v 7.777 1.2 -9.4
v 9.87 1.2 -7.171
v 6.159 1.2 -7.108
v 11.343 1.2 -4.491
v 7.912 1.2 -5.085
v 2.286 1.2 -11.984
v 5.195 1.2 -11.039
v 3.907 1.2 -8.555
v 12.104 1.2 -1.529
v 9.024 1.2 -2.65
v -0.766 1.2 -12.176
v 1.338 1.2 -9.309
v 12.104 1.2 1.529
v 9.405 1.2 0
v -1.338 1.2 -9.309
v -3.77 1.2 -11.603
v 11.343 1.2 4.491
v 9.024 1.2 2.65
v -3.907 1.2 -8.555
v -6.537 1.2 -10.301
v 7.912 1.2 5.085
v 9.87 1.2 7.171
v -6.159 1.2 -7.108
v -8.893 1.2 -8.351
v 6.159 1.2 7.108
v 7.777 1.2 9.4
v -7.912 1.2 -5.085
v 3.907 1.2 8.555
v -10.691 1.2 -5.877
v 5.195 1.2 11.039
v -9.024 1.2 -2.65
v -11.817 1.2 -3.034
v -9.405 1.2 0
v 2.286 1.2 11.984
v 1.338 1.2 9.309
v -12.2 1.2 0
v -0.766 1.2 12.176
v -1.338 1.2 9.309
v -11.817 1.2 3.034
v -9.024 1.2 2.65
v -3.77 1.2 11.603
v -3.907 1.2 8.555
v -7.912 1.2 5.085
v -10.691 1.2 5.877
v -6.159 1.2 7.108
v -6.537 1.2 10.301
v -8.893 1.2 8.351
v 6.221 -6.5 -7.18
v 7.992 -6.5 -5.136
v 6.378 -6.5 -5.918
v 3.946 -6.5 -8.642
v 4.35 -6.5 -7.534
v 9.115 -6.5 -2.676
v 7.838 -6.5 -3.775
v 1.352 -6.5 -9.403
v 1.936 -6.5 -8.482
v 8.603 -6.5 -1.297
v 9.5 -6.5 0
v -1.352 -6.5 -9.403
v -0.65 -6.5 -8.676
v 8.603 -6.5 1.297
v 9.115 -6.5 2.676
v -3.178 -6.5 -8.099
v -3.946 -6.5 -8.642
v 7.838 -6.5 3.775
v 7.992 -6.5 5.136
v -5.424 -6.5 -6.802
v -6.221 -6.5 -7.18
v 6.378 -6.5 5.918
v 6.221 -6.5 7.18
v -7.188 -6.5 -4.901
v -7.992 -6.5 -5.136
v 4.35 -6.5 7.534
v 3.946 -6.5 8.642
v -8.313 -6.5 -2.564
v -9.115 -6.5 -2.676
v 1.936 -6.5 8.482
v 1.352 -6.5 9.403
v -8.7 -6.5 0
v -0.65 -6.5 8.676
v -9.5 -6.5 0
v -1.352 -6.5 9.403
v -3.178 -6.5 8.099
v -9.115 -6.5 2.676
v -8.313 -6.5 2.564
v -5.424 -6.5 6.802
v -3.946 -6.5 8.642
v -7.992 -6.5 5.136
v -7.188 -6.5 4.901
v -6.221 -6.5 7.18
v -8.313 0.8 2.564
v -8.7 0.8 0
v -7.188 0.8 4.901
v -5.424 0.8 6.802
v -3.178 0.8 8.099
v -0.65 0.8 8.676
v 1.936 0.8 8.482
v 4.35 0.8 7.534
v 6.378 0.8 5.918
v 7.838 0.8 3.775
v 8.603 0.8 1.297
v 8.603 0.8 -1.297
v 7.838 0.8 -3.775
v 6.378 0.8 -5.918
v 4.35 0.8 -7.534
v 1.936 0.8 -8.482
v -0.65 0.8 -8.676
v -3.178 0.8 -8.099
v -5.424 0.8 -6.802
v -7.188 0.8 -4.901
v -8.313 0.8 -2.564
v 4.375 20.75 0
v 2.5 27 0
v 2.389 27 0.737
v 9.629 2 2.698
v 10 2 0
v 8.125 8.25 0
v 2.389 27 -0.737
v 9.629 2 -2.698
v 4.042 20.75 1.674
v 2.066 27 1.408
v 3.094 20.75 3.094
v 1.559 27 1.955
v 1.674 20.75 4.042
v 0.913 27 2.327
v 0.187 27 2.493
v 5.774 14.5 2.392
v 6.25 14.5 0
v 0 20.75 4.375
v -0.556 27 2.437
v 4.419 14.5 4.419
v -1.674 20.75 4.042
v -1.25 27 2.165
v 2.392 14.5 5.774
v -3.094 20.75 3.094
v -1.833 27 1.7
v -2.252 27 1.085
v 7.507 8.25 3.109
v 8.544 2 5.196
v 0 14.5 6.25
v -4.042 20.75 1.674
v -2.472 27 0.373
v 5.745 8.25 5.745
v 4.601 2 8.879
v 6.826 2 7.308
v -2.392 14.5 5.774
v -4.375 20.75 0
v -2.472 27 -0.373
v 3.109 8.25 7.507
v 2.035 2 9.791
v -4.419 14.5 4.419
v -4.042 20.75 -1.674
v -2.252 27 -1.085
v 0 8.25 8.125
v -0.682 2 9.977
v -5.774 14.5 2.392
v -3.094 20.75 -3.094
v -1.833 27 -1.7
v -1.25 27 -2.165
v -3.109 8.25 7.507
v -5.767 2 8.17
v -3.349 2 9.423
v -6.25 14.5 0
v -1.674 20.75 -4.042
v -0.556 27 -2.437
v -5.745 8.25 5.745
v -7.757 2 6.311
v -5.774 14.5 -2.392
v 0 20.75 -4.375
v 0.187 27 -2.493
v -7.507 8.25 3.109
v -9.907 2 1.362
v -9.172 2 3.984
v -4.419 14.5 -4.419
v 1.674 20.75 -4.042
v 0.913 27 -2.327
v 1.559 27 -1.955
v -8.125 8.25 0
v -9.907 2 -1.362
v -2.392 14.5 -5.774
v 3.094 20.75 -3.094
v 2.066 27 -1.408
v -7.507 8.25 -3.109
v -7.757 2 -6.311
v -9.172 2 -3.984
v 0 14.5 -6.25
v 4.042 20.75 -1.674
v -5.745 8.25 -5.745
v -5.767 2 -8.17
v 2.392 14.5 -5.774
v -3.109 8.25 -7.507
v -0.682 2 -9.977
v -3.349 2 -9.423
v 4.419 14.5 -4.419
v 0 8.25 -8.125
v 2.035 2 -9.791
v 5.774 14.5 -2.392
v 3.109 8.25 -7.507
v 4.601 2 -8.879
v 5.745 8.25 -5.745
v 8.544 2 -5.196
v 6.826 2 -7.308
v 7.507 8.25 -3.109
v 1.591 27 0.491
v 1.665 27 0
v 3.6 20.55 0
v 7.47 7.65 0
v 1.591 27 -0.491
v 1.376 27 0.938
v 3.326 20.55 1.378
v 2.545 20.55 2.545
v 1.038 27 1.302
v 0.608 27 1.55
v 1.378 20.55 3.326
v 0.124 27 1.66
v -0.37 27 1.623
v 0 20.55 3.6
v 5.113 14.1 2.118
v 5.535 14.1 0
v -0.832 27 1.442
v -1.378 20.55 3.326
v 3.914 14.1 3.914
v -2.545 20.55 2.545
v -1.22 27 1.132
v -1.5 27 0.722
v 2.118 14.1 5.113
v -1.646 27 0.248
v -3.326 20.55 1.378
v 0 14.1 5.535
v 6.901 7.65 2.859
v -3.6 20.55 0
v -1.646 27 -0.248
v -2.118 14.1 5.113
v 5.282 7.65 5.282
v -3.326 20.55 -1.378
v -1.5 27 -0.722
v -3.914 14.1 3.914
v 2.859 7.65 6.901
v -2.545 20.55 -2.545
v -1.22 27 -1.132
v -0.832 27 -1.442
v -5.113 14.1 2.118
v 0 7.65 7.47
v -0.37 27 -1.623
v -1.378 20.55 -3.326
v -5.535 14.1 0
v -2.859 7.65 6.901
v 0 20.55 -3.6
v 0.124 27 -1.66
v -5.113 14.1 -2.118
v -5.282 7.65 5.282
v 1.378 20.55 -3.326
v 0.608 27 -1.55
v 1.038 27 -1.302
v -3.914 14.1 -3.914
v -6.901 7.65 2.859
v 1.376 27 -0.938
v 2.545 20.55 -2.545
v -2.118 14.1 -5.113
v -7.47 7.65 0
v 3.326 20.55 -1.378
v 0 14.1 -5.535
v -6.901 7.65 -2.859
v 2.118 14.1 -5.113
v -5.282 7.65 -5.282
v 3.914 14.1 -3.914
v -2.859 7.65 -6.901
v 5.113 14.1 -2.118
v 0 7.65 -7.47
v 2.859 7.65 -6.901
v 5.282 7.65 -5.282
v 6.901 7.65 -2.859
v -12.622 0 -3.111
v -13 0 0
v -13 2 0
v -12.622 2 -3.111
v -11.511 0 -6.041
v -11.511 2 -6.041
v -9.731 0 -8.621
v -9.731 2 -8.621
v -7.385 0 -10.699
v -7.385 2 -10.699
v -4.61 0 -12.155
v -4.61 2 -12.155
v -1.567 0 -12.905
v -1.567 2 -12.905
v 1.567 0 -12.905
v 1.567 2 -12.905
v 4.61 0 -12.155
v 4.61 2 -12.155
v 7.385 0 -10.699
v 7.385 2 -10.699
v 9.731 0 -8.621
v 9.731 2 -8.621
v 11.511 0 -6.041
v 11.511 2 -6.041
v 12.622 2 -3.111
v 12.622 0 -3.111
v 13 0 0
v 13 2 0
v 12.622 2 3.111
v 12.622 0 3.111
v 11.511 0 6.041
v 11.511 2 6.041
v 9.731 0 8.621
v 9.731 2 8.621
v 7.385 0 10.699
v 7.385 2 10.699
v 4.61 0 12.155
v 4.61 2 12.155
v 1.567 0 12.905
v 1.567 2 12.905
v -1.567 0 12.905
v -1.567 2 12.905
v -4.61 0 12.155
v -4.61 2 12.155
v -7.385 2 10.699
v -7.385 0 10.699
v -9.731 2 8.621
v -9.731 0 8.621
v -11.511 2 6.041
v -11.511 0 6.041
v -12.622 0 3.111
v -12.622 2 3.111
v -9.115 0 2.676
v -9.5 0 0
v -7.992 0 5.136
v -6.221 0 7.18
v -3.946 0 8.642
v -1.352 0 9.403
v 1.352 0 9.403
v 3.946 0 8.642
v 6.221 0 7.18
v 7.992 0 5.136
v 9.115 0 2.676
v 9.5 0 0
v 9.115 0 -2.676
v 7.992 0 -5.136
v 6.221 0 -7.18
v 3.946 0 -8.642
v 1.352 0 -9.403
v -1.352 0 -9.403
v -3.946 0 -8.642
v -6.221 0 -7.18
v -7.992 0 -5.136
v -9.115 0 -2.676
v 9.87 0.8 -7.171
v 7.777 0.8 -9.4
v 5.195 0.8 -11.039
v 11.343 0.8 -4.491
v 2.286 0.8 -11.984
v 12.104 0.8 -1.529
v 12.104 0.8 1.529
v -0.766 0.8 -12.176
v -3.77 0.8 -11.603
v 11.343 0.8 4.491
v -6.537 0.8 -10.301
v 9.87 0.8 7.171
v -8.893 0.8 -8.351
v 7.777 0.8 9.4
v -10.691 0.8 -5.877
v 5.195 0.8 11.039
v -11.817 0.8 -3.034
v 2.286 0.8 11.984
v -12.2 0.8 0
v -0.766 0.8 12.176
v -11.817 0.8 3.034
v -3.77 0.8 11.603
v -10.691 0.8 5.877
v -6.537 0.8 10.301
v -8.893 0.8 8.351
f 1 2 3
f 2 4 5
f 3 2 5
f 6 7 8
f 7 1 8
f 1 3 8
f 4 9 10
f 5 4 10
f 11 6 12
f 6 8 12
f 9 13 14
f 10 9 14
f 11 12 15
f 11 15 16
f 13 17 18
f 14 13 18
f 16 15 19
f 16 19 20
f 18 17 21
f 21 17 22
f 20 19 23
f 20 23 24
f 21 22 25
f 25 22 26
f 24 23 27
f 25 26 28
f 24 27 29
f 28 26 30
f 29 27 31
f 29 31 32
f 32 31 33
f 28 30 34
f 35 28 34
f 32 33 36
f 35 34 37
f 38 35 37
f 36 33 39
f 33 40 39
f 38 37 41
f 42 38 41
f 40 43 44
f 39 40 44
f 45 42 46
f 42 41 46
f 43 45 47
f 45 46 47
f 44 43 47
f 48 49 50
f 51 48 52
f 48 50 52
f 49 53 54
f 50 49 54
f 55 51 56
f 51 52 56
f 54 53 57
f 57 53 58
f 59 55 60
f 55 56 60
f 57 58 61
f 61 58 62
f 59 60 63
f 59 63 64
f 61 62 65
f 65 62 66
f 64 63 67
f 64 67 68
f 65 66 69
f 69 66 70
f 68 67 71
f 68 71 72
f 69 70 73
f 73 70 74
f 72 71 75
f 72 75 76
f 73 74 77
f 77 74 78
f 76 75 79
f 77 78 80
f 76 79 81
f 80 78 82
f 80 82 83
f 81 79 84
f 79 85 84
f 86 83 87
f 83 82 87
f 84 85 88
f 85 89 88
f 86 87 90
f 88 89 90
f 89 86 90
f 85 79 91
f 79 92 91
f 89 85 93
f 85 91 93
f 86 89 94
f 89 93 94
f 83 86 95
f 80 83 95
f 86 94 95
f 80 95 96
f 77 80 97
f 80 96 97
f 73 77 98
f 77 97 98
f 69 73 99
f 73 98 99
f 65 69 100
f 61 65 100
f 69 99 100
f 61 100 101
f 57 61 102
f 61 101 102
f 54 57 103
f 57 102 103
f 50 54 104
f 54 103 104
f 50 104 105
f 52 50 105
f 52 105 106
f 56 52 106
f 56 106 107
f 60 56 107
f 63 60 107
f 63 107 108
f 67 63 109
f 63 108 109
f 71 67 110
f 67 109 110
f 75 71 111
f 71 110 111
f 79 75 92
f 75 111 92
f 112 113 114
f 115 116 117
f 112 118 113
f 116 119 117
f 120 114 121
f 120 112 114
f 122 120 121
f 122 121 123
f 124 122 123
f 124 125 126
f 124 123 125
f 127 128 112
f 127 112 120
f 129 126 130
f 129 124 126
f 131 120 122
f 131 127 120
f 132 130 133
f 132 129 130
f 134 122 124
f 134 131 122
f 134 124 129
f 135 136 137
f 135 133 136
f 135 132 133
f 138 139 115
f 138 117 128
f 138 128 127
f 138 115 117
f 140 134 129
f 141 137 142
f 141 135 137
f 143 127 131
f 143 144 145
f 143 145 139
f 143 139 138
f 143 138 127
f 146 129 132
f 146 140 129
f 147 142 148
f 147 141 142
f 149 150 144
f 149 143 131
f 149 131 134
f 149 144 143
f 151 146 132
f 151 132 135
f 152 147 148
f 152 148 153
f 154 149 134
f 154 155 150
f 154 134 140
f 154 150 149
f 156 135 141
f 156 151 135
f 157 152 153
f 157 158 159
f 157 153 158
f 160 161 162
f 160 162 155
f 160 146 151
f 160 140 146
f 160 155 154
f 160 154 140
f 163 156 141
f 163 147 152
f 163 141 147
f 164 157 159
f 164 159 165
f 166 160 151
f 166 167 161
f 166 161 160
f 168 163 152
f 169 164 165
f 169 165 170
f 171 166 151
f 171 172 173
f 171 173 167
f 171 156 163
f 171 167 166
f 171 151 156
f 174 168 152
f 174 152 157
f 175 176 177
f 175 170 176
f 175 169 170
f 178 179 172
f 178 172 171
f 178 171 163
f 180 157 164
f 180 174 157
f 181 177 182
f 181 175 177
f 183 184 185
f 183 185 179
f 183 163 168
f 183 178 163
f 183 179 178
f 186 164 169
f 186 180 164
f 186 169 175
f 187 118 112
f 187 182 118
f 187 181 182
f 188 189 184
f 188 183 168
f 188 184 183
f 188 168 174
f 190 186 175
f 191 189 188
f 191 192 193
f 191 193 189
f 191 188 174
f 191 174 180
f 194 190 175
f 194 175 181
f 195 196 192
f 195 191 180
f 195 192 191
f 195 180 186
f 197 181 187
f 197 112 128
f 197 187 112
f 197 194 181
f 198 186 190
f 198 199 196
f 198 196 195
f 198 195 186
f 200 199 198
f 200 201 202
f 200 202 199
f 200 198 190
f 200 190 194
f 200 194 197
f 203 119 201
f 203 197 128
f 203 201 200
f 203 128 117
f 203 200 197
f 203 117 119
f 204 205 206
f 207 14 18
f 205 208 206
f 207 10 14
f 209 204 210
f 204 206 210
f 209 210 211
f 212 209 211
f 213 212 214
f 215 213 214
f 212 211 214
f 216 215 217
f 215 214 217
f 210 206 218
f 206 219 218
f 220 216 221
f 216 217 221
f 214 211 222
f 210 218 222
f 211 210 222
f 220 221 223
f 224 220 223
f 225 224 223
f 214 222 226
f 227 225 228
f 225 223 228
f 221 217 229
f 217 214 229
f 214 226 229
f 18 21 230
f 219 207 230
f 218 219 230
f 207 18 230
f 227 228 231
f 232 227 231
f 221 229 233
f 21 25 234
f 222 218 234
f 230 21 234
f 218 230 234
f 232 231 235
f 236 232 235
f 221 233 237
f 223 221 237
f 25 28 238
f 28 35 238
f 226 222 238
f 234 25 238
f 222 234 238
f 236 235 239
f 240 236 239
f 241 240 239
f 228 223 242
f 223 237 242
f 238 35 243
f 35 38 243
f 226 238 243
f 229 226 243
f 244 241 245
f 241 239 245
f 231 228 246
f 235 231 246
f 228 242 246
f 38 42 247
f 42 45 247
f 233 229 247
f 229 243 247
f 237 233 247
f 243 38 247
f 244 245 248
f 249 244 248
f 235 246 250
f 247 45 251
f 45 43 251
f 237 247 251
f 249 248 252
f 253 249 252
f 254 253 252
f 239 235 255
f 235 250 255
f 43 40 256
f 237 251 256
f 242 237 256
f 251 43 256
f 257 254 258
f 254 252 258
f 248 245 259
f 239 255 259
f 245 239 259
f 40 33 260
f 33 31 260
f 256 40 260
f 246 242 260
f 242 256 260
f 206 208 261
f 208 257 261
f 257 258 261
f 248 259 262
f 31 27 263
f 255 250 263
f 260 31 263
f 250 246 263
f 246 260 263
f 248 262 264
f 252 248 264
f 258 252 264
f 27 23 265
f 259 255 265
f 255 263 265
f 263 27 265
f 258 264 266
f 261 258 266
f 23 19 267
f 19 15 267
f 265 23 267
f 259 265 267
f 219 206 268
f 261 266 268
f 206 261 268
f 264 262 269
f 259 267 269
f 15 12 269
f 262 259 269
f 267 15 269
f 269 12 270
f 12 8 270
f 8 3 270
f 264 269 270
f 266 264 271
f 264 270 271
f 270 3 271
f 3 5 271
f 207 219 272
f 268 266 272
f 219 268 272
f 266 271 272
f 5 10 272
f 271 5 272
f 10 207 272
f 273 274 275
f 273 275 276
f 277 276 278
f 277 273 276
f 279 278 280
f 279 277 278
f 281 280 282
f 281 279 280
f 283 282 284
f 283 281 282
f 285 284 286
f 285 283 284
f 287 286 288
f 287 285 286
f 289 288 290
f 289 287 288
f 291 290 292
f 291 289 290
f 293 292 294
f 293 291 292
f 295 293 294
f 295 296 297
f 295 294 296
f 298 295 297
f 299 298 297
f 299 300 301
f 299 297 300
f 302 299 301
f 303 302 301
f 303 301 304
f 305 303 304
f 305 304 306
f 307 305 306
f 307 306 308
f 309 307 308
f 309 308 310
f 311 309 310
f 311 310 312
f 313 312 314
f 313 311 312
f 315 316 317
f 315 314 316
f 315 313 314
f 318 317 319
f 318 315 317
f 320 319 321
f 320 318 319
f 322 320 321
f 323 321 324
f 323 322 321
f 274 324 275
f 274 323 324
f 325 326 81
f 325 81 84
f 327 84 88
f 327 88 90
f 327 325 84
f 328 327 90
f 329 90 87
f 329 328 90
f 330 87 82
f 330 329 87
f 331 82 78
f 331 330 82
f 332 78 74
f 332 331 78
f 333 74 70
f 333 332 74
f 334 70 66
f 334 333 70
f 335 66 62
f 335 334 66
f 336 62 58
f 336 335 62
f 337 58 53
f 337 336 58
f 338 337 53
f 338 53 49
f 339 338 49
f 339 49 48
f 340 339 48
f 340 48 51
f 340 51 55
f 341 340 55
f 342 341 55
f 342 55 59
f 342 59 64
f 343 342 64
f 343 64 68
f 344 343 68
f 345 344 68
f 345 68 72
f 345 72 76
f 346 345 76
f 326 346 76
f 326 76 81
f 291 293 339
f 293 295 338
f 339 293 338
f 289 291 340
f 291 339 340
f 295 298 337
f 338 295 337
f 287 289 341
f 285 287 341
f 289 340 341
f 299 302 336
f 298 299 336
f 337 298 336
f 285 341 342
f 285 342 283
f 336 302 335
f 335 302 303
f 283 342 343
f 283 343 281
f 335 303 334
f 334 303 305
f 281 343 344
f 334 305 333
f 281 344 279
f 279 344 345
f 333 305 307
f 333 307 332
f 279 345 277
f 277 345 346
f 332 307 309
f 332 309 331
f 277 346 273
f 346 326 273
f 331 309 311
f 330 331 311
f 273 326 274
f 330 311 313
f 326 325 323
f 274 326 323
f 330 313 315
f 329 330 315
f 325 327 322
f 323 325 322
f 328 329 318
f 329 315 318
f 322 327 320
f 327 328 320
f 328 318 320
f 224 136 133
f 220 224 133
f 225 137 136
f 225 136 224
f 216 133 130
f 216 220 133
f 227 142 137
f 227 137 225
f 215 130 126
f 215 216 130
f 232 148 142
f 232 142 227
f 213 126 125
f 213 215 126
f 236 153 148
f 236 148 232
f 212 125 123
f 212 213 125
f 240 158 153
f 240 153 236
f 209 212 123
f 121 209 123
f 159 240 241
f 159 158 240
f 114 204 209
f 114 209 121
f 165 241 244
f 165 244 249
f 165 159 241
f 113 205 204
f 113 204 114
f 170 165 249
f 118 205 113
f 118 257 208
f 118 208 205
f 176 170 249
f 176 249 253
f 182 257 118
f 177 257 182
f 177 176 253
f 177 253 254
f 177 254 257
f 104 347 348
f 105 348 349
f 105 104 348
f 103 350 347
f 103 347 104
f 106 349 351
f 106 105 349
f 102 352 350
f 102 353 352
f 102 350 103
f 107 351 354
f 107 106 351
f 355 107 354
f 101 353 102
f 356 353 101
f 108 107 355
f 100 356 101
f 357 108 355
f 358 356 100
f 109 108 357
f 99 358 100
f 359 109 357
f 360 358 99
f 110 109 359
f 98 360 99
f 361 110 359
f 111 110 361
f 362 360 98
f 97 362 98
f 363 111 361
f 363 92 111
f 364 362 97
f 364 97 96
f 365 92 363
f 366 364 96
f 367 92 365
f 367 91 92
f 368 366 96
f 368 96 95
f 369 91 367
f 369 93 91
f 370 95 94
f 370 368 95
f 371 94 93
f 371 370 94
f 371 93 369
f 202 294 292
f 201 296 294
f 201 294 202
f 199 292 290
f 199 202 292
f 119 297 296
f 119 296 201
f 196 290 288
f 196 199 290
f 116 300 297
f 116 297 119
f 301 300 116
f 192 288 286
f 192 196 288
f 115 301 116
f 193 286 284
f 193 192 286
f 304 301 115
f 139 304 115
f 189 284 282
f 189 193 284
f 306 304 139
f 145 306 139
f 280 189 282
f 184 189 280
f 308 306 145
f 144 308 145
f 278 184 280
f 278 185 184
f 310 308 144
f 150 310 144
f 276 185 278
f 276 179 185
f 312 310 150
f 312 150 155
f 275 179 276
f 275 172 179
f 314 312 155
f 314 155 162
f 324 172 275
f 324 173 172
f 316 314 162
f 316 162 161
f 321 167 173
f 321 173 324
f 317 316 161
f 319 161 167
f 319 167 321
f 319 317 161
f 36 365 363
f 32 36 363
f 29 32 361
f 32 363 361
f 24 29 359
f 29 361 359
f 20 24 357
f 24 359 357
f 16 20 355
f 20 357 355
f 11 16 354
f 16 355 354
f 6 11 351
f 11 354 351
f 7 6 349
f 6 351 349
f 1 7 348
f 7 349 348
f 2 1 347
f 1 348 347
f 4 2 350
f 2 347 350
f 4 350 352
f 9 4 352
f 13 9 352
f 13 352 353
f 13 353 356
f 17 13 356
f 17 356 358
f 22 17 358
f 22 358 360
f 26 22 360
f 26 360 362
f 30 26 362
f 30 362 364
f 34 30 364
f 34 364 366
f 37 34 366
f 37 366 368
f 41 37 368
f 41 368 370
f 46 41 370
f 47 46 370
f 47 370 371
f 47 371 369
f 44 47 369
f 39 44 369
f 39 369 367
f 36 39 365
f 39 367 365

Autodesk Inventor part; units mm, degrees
ref_plane "YZ Plane" through (0, 0, 0) normal (1, 0, 0) x (0, 1, 0)
ref_plane "XZ Plane" through (0, 0, 0) normal (0, 1, 0) x (-1, 0, 0)
sketch "Sketch1" plane through (0, 0, 0) normal (0, 1, 0) x (-1, 0, 0)
  circle A0 centre (0, 0) radius 9.5
  circle A1 centre (0, 0) radius 13
  dimension "d0" = 19
  dimension "d3" = 26
extrude "Extrusion1" add sketch "Sketch1" against normal blind 6.5 contours A0
extrude "Extrusion2" add sketch "Sketch1" along normal blind 2 contours A0 | A1
sketch "Sketch2" plane through (0, 2, 0) normal (0, 1, 0) x (1, 0, 0)
  circle A0 centre (0, 0) radius 13 projected
  circle A1 centre (0, 0) radius 10
  dimension "d6" = 20
ref_plane "Work Plane1" through (0, 27, 0) normal (0, 1, 0) x (1, 0, 0)
sketch "Sketch3" plane through (0, 27, 0) normal (0, 1, 0) x (1, 0, 0)
  circle A0 centre (0, 0) radius 2.5
  dimension "d8" = 5
loft "Loft1" add profiles "Sketch3", "Sketch2" contours all / A1
shell "Shell1" thickness 0.8 removed faces 2 at (1.2612, 27, 0.6619) at (-2.3703, -6.5, -2.0999)
properties part number "Microsuction"
